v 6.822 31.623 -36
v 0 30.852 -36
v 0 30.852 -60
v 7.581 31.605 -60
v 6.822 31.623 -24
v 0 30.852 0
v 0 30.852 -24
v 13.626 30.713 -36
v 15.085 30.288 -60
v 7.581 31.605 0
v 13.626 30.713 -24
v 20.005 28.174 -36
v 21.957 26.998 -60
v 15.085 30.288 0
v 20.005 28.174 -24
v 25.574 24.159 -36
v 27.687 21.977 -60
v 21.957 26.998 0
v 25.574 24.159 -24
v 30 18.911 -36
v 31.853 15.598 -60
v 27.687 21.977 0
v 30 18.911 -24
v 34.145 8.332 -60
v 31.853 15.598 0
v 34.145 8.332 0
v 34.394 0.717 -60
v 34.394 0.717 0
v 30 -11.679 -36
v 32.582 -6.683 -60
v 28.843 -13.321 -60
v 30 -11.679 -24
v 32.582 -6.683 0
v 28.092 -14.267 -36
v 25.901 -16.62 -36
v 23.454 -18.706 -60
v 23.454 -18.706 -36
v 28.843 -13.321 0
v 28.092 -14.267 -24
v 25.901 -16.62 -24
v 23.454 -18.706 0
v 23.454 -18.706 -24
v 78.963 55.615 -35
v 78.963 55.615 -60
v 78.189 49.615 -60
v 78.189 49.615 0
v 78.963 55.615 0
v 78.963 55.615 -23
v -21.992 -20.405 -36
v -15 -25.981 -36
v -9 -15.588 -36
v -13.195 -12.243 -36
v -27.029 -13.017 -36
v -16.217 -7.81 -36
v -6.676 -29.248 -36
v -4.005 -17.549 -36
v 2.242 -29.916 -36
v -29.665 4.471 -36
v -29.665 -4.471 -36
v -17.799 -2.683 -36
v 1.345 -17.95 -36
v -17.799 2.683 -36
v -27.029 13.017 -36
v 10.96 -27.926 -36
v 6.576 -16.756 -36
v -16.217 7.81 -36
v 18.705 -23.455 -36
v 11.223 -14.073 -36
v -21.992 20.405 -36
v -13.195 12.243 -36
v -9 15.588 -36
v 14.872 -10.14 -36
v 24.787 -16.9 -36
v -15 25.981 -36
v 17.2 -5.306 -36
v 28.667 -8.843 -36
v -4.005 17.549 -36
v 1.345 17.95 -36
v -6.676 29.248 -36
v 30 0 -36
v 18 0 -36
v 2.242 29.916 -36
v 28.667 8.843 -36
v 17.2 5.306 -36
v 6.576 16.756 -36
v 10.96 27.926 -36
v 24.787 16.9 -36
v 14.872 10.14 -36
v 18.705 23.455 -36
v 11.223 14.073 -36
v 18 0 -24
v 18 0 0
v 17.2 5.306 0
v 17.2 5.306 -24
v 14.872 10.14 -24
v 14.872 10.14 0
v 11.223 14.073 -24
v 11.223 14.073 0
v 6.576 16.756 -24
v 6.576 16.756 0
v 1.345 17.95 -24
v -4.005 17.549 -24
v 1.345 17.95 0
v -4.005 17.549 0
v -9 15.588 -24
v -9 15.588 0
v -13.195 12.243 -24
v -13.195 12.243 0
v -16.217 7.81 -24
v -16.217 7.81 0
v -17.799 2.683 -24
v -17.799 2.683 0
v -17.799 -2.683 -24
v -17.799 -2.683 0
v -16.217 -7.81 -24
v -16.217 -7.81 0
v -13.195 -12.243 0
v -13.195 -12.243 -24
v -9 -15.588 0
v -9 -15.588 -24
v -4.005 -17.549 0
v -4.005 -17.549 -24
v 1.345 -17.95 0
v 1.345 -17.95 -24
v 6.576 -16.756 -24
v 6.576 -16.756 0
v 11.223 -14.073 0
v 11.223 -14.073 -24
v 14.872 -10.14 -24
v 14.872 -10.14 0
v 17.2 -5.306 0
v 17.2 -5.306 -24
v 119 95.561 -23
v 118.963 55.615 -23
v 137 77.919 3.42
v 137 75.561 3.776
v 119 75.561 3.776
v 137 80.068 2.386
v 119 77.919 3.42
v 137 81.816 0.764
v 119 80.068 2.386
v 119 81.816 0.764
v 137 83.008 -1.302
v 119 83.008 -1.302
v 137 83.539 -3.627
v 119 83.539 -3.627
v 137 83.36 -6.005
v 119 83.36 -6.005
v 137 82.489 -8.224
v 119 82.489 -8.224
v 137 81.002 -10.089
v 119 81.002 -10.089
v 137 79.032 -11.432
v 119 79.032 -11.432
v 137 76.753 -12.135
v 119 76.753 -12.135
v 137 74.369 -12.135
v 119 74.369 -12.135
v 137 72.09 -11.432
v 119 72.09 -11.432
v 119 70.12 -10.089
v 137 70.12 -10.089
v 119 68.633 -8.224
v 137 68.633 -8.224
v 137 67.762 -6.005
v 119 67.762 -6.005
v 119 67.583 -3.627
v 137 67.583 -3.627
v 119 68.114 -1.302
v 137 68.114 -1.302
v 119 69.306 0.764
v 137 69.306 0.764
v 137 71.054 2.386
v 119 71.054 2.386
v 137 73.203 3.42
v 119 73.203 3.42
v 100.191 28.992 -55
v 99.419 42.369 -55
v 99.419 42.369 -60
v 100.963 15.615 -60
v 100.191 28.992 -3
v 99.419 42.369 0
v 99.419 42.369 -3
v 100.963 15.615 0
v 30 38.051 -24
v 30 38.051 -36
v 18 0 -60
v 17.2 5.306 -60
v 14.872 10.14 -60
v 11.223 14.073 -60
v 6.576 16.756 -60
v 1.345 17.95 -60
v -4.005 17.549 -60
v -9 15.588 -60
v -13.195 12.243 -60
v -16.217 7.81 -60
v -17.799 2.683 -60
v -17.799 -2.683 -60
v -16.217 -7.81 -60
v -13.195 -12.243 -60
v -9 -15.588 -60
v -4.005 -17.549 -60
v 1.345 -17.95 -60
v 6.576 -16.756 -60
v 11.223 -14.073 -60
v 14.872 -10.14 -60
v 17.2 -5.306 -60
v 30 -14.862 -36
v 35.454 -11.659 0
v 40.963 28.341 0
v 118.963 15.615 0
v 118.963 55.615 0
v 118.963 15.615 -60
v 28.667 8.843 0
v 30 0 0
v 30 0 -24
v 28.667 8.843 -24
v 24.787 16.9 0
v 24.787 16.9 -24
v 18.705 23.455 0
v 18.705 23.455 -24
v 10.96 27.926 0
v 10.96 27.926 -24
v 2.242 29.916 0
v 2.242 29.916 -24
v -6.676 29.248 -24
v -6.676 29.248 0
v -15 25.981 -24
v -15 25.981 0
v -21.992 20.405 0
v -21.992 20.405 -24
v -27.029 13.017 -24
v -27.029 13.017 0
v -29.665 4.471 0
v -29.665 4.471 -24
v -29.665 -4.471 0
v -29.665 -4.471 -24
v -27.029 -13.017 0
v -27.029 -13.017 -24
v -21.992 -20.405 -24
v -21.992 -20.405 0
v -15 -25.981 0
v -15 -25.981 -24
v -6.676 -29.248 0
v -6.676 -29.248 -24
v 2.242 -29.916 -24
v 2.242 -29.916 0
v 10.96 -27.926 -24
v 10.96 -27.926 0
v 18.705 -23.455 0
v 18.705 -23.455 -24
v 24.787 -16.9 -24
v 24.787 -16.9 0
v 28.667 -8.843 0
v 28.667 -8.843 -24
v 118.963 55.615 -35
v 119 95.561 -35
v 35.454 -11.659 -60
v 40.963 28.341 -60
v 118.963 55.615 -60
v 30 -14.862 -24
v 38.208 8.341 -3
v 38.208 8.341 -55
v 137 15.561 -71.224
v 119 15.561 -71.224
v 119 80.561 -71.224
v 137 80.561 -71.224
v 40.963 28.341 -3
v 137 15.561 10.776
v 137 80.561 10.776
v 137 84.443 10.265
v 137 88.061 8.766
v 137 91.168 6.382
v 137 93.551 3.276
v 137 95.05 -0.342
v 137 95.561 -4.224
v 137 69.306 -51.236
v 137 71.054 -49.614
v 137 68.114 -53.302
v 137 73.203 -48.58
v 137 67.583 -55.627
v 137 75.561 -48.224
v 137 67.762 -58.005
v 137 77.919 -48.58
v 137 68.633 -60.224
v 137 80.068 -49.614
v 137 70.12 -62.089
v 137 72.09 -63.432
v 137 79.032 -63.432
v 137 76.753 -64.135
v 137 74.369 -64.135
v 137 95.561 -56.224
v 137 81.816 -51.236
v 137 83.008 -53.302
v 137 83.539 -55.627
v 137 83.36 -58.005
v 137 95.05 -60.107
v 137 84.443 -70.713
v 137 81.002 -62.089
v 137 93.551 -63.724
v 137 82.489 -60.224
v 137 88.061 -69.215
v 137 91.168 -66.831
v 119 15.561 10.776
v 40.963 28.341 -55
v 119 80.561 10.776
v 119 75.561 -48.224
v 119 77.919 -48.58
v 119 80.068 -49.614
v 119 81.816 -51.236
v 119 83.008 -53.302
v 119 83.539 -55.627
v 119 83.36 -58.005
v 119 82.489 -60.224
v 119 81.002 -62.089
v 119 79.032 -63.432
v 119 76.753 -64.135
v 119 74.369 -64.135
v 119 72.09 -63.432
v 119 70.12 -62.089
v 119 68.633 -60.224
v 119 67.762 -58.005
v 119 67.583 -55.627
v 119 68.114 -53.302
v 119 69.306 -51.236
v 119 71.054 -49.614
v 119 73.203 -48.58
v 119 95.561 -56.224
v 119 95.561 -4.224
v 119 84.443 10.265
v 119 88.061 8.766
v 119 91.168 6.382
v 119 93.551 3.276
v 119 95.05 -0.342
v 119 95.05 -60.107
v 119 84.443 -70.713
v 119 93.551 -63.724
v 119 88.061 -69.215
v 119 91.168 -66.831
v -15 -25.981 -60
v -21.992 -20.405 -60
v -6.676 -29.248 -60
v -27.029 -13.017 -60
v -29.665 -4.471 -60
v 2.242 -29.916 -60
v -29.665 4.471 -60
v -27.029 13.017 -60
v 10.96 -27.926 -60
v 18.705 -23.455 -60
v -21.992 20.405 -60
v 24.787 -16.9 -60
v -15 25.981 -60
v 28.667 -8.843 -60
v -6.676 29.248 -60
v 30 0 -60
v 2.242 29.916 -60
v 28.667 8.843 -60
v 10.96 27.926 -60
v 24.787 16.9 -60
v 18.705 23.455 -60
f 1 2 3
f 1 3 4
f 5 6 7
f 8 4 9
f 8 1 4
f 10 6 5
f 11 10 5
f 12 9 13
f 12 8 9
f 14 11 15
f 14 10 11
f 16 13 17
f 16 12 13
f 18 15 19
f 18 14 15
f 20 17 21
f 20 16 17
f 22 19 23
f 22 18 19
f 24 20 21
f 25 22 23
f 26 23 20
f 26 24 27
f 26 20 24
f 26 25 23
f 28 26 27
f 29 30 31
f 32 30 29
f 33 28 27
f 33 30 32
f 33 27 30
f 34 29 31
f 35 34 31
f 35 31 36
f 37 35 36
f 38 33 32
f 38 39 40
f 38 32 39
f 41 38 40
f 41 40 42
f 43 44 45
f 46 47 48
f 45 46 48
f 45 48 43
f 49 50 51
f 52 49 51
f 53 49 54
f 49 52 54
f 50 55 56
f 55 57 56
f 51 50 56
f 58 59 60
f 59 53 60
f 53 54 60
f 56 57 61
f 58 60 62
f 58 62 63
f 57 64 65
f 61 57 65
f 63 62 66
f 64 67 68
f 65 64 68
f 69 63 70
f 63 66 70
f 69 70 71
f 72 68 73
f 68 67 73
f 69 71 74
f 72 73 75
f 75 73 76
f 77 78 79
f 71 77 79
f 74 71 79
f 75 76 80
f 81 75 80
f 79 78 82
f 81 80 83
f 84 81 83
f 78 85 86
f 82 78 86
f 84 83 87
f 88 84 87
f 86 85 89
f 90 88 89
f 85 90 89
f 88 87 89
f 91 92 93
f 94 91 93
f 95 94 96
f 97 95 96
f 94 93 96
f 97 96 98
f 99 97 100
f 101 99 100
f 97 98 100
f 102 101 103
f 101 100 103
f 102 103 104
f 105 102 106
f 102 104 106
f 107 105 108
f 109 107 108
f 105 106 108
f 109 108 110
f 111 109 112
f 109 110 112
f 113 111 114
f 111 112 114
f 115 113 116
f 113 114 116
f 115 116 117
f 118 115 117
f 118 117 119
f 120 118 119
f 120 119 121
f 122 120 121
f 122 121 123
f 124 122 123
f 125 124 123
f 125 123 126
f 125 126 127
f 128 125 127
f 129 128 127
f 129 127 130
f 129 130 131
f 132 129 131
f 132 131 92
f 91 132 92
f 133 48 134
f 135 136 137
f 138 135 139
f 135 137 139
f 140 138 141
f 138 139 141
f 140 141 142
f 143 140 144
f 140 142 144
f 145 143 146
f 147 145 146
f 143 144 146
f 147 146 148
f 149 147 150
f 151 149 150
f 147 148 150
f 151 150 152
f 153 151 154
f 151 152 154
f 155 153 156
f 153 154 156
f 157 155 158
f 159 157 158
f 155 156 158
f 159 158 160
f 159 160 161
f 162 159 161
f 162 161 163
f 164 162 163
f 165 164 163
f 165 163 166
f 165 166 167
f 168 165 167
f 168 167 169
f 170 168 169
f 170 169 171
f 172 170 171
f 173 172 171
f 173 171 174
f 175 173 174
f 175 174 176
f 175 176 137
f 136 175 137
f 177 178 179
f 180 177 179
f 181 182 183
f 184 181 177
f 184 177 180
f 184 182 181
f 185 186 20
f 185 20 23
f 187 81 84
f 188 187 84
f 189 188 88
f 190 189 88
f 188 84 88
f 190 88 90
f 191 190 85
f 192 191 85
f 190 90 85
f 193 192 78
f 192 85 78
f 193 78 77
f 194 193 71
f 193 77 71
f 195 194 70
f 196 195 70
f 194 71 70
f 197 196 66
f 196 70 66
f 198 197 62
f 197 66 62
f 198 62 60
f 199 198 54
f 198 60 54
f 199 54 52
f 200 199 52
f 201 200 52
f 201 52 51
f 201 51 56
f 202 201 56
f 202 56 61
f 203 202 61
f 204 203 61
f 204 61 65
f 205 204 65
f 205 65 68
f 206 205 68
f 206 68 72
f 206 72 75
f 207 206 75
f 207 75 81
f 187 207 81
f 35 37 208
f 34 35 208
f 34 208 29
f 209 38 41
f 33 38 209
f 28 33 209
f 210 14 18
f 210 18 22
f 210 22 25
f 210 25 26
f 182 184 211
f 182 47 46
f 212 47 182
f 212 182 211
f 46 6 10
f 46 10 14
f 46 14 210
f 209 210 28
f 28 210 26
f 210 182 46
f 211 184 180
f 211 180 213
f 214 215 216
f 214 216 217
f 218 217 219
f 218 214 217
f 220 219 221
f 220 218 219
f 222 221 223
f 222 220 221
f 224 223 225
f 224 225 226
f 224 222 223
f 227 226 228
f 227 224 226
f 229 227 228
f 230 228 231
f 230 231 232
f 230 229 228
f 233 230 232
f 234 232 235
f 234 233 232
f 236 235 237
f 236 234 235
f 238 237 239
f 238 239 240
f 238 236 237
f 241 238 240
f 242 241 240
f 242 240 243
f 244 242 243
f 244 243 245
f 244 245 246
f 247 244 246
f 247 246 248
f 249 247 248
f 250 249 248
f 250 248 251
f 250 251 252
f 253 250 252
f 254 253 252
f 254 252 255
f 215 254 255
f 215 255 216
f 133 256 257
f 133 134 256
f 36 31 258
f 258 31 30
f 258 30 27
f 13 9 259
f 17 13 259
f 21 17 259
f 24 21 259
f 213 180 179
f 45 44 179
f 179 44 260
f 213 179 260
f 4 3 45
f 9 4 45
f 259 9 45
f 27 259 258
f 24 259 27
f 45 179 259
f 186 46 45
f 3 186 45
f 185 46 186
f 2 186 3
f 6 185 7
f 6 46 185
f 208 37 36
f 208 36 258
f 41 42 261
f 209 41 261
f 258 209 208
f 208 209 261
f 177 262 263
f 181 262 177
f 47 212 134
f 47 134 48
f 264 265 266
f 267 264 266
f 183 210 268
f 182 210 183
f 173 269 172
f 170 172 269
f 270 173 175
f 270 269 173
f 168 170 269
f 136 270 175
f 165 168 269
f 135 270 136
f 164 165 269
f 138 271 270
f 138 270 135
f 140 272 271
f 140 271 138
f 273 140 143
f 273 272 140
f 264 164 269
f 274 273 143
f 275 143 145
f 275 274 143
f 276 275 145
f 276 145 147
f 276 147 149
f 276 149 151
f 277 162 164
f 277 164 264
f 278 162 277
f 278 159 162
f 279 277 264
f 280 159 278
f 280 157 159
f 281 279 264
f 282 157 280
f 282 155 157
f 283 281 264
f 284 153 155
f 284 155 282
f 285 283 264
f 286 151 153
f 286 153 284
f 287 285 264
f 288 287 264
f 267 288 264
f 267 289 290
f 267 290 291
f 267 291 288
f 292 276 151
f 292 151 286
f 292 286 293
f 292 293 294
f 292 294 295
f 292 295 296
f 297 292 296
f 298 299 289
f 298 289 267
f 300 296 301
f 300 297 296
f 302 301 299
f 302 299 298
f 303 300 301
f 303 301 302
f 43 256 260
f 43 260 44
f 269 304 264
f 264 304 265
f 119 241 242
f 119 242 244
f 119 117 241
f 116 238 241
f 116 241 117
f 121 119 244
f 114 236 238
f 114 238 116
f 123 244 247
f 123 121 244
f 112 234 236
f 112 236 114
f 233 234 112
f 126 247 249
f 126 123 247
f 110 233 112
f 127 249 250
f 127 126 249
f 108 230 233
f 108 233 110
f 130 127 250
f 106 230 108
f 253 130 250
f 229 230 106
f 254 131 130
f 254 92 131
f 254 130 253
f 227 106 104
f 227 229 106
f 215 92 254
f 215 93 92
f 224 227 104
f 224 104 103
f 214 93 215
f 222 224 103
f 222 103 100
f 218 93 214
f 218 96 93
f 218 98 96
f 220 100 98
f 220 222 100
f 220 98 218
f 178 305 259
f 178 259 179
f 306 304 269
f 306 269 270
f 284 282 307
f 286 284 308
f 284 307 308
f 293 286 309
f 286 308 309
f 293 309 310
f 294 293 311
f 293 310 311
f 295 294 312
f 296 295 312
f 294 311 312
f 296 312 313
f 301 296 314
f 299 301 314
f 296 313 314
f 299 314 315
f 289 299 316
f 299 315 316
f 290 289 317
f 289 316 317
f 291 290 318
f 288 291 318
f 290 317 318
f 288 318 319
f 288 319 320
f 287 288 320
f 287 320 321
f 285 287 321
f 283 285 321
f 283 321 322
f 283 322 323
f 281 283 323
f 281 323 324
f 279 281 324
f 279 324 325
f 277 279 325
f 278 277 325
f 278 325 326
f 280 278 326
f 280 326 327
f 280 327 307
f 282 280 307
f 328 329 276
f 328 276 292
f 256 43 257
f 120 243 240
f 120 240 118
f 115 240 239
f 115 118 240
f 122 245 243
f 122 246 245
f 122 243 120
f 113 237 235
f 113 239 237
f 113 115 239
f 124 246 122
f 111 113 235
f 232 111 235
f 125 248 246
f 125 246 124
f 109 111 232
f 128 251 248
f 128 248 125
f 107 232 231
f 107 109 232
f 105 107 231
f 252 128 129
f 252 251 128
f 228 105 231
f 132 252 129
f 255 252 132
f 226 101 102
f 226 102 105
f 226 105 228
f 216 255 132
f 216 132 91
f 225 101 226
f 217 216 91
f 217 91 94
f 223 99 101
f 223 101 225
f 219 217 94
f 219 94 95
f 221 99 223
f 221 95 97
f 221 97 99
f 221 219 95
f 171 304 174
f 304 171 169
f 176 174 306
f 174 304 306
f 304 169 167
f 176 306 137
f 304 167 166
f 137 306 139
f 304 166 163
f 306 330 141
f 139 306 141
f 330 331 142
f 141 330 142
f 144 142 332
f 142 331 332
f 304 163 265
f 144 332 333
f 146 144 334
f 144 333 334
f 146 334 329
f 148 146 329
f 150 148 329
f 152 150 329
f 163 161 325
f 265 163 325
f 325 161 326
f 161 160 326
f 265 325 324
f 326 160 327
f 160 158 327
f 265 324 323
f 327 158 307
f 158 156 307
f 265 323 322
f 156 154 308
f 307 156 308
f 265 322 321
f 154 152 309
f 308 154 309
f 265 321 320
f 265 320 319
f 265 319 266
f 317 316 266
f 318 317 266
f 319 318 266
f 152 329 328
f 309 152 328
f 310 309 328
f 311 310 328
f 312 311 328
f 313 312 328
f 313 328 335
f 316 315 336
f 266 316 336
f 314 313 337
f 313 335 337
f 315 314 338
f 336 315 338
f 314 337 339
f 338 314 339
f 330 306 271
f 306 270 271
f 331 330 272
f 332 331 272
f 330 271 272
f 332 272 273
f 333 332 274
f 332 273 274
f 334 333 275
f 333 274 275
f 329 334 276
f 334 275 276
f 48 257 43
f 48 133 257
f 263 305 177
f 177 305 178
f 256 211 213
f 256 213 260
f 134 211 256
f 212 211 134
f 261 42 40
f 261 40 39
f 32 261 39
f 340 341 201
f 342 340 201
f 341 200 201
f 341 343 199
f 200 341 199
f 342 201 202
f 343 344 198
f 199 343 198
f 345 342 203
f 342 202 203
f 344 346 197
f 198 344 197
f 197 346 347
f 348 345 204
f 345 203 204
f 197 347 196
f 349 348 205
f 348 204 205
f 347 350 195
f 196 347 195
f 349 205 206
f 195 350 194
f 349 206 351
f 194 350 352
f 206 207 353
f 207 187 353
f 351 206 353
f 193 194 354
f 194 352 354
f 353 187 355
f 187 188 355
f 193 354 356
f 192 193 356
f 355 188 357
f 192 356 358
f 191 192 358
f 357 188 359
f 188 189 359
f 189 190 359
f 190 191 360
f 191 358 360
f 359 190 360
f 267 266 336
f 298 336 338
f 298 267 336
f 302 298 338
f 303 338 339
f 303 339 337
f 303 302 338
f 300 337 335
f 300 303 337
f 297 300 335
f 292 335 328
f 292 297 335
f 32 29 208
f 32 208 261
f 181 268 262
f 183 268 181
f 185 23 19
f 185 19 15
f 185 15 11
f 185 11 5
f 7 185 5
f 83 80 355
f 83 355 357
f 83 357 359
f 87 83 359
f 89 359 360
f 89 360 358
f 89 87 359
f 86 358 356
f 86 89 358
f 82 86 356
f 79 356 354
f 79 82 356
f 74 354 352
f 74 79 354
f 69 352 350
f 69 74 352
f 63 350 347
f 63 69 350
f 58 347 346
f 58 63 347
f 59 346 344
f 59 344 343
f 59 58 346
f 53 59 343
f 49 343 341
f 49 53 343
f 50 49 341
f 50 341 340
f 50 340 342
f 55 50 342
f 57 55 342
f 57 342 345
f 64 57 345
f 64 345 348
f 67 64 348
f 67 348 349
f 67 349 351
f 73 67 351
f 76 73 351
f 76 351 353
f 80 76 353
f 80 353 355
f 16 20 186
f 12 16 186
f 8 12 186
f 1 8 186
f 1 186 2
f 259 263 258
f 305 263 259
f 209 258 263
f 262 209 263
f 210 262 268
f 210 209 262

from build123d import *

# Parameters (mm, degrees)
BOSS_EXTRUDE1_DEPTH   = 60
SKETCH1_R             = 30
SKETCH1_R_2           = 18
BOSS_EXTRUDE1_2_DEPTH = 60
SKETCH2_W             = 82
SKETCH2_H             = 80
BOSS_EXTRUDE2_DEPTH   = 18
FILLET1_R             = 15
BOSS_EXTRUDE3_DEPTH   = 6
SKETCH4_W             = 12
SKETCH4_H             = 81.808437473
CUT_EXTRUDE1_DEPTH    = 62
SKETCH9_R             = 8
CUT_EXTRUDE2_DEPTH    = 32
BOSS_EXTRUDE4_DEPTH   = 26


with BuildPart() as part:
    # Sketch1 → Boss-Extrude1 (new body)
    with BuildSketch(Plane.XY):
        with BuildLine():
            Line((78.188542599, 49.614870773), (0, 30.851716638))
            ThreePointArc((0, 30.851716638), (31.852594073, 15.597634824), (23.453928376, -18.705968131))
            Line((23.453928376, -18.705968131), (35.453928376, -11.659038808))
            Line((35.453928376, -11.659038808), (40.962622254, 28.340961192))
            Line((40.962622254, 28.340961192), (99.418852734, 42.368889405))
            Line((99.418852734, 42.368889405), (100.962622254, 15.614870773))
            Line((100.962622254, 15.614870773), (118.962622254, 15.614870773))
            Line((118.962622254, 15.614870773), (118.962622254, 55.614870773))
            Line((118.962622254, 55.614870773), (78.962622254, 55.614870773))
            Line((78.962622254, 55.614870773), (78.188542599, 49.614870773))
        make_face()
    extrude(amount=-BOSS_EXTRUDE1_DEPTH)

    # Sketch3 → Boss-Extrude3 (add, symmetric)
    with BuildSketch(Plane.XY.offset(-29)):
        Polygon((119, 95.5609912), (78.962622254, 55.614870773), (118.962622254, 55.614870773), align=None)
    extrude(amount=BOSS_EXTRUDE3_DEPTH, both=True)


with BuildPart() as body_2:
    # Sketch1 → Boss-Extrude1 2 (new body)
    with BuildSketch(Plane.XY):
        Circle(SKETCH1_R)
        Circle(SKETCH1_R_2, mode=Mode.SUBTRACT)
    extrude(amount=-BOSS_EXTRUDE1_2_DEPTH)


with BuildPart() as body_3:
    # Sketch2 → Boss-Extrude2 (new body)
    with BuildSketch(Plane(origin=(119, 0, 0), x_dir=(0, 0, -1), z_dir=(1, 0, 0))):
        with Locations((30.224366482, 55.5609912)):
            Rectangle(SKETCH2_W, SKETCH2_H)
    extrude(amount=BOSS_EXTRUDE2_DEPTH)

    # Fillet1
    fillet1_edges = [body_3.edges().sort_by_distance(p)[0] for p in [
        (128, 95.5609912, 10.775633518),
        (128, 95.5609912, -71.224366482),
    ]]
    fillet(fillet1_edges, radius=FILLET1_R)

    # Sketch9 → Cut-Extrude2 (cut)
    with BuildSketch(Plane.ZY.offset(-119)):
        with Locations((-56.224366482, 75.5609912)):
            Circle(SKETCH9_R)
        with Locations((-4.224366482, 75.5609912)):
            Circle(SKETCH9_R)
    extrude(amount=-CUT_EXTRUDE2_DEPTH, mode=Mode.SUBTRACT)


with BuildPart() as cut_extrude1_tool:
    # Sketch4 → Cut-Extrude1 (new body)
    with BuildSketch(Plane.ZY.offset(-30)):
        with Locations((-30, 5.781361386)):
            Rectangle(SKETCH4_W, SKETCH4_H)
    extrude(amount=CUT_EXTRUDE1_DEPTH)


with BuildPart() as part_1:
    add(part.part)

    # Cut-Extrude1: cut by cut_extrude1_tool
    add(cut_extrude1_tool.part, mode=Mode.SUBTRACT)

    # Sketch10 → Boss-Extrude4 (add, symmetric)
    with BuildSketch(Plane.XY.offset(-29)):
        Polygon((38.208275315, 8.340961192), (100.190737494, 28.991880089), (99.418852734, 42.368889405), (40.962622254, 28.340961192), align=None)
    extrude(amount=BOSS_EXTRUDE4_DEPTH, both=True)


with BuildPart() as body_2_1:
    add(body_2.part)

    # Cut-Extrude1: cut by cut_extrude1_tool
    add(cut_extrude1_tool.part, mode=Mode.SUBTRACT)


solid = Compound([body_3.part, part_1.part, body_2_1.part])
